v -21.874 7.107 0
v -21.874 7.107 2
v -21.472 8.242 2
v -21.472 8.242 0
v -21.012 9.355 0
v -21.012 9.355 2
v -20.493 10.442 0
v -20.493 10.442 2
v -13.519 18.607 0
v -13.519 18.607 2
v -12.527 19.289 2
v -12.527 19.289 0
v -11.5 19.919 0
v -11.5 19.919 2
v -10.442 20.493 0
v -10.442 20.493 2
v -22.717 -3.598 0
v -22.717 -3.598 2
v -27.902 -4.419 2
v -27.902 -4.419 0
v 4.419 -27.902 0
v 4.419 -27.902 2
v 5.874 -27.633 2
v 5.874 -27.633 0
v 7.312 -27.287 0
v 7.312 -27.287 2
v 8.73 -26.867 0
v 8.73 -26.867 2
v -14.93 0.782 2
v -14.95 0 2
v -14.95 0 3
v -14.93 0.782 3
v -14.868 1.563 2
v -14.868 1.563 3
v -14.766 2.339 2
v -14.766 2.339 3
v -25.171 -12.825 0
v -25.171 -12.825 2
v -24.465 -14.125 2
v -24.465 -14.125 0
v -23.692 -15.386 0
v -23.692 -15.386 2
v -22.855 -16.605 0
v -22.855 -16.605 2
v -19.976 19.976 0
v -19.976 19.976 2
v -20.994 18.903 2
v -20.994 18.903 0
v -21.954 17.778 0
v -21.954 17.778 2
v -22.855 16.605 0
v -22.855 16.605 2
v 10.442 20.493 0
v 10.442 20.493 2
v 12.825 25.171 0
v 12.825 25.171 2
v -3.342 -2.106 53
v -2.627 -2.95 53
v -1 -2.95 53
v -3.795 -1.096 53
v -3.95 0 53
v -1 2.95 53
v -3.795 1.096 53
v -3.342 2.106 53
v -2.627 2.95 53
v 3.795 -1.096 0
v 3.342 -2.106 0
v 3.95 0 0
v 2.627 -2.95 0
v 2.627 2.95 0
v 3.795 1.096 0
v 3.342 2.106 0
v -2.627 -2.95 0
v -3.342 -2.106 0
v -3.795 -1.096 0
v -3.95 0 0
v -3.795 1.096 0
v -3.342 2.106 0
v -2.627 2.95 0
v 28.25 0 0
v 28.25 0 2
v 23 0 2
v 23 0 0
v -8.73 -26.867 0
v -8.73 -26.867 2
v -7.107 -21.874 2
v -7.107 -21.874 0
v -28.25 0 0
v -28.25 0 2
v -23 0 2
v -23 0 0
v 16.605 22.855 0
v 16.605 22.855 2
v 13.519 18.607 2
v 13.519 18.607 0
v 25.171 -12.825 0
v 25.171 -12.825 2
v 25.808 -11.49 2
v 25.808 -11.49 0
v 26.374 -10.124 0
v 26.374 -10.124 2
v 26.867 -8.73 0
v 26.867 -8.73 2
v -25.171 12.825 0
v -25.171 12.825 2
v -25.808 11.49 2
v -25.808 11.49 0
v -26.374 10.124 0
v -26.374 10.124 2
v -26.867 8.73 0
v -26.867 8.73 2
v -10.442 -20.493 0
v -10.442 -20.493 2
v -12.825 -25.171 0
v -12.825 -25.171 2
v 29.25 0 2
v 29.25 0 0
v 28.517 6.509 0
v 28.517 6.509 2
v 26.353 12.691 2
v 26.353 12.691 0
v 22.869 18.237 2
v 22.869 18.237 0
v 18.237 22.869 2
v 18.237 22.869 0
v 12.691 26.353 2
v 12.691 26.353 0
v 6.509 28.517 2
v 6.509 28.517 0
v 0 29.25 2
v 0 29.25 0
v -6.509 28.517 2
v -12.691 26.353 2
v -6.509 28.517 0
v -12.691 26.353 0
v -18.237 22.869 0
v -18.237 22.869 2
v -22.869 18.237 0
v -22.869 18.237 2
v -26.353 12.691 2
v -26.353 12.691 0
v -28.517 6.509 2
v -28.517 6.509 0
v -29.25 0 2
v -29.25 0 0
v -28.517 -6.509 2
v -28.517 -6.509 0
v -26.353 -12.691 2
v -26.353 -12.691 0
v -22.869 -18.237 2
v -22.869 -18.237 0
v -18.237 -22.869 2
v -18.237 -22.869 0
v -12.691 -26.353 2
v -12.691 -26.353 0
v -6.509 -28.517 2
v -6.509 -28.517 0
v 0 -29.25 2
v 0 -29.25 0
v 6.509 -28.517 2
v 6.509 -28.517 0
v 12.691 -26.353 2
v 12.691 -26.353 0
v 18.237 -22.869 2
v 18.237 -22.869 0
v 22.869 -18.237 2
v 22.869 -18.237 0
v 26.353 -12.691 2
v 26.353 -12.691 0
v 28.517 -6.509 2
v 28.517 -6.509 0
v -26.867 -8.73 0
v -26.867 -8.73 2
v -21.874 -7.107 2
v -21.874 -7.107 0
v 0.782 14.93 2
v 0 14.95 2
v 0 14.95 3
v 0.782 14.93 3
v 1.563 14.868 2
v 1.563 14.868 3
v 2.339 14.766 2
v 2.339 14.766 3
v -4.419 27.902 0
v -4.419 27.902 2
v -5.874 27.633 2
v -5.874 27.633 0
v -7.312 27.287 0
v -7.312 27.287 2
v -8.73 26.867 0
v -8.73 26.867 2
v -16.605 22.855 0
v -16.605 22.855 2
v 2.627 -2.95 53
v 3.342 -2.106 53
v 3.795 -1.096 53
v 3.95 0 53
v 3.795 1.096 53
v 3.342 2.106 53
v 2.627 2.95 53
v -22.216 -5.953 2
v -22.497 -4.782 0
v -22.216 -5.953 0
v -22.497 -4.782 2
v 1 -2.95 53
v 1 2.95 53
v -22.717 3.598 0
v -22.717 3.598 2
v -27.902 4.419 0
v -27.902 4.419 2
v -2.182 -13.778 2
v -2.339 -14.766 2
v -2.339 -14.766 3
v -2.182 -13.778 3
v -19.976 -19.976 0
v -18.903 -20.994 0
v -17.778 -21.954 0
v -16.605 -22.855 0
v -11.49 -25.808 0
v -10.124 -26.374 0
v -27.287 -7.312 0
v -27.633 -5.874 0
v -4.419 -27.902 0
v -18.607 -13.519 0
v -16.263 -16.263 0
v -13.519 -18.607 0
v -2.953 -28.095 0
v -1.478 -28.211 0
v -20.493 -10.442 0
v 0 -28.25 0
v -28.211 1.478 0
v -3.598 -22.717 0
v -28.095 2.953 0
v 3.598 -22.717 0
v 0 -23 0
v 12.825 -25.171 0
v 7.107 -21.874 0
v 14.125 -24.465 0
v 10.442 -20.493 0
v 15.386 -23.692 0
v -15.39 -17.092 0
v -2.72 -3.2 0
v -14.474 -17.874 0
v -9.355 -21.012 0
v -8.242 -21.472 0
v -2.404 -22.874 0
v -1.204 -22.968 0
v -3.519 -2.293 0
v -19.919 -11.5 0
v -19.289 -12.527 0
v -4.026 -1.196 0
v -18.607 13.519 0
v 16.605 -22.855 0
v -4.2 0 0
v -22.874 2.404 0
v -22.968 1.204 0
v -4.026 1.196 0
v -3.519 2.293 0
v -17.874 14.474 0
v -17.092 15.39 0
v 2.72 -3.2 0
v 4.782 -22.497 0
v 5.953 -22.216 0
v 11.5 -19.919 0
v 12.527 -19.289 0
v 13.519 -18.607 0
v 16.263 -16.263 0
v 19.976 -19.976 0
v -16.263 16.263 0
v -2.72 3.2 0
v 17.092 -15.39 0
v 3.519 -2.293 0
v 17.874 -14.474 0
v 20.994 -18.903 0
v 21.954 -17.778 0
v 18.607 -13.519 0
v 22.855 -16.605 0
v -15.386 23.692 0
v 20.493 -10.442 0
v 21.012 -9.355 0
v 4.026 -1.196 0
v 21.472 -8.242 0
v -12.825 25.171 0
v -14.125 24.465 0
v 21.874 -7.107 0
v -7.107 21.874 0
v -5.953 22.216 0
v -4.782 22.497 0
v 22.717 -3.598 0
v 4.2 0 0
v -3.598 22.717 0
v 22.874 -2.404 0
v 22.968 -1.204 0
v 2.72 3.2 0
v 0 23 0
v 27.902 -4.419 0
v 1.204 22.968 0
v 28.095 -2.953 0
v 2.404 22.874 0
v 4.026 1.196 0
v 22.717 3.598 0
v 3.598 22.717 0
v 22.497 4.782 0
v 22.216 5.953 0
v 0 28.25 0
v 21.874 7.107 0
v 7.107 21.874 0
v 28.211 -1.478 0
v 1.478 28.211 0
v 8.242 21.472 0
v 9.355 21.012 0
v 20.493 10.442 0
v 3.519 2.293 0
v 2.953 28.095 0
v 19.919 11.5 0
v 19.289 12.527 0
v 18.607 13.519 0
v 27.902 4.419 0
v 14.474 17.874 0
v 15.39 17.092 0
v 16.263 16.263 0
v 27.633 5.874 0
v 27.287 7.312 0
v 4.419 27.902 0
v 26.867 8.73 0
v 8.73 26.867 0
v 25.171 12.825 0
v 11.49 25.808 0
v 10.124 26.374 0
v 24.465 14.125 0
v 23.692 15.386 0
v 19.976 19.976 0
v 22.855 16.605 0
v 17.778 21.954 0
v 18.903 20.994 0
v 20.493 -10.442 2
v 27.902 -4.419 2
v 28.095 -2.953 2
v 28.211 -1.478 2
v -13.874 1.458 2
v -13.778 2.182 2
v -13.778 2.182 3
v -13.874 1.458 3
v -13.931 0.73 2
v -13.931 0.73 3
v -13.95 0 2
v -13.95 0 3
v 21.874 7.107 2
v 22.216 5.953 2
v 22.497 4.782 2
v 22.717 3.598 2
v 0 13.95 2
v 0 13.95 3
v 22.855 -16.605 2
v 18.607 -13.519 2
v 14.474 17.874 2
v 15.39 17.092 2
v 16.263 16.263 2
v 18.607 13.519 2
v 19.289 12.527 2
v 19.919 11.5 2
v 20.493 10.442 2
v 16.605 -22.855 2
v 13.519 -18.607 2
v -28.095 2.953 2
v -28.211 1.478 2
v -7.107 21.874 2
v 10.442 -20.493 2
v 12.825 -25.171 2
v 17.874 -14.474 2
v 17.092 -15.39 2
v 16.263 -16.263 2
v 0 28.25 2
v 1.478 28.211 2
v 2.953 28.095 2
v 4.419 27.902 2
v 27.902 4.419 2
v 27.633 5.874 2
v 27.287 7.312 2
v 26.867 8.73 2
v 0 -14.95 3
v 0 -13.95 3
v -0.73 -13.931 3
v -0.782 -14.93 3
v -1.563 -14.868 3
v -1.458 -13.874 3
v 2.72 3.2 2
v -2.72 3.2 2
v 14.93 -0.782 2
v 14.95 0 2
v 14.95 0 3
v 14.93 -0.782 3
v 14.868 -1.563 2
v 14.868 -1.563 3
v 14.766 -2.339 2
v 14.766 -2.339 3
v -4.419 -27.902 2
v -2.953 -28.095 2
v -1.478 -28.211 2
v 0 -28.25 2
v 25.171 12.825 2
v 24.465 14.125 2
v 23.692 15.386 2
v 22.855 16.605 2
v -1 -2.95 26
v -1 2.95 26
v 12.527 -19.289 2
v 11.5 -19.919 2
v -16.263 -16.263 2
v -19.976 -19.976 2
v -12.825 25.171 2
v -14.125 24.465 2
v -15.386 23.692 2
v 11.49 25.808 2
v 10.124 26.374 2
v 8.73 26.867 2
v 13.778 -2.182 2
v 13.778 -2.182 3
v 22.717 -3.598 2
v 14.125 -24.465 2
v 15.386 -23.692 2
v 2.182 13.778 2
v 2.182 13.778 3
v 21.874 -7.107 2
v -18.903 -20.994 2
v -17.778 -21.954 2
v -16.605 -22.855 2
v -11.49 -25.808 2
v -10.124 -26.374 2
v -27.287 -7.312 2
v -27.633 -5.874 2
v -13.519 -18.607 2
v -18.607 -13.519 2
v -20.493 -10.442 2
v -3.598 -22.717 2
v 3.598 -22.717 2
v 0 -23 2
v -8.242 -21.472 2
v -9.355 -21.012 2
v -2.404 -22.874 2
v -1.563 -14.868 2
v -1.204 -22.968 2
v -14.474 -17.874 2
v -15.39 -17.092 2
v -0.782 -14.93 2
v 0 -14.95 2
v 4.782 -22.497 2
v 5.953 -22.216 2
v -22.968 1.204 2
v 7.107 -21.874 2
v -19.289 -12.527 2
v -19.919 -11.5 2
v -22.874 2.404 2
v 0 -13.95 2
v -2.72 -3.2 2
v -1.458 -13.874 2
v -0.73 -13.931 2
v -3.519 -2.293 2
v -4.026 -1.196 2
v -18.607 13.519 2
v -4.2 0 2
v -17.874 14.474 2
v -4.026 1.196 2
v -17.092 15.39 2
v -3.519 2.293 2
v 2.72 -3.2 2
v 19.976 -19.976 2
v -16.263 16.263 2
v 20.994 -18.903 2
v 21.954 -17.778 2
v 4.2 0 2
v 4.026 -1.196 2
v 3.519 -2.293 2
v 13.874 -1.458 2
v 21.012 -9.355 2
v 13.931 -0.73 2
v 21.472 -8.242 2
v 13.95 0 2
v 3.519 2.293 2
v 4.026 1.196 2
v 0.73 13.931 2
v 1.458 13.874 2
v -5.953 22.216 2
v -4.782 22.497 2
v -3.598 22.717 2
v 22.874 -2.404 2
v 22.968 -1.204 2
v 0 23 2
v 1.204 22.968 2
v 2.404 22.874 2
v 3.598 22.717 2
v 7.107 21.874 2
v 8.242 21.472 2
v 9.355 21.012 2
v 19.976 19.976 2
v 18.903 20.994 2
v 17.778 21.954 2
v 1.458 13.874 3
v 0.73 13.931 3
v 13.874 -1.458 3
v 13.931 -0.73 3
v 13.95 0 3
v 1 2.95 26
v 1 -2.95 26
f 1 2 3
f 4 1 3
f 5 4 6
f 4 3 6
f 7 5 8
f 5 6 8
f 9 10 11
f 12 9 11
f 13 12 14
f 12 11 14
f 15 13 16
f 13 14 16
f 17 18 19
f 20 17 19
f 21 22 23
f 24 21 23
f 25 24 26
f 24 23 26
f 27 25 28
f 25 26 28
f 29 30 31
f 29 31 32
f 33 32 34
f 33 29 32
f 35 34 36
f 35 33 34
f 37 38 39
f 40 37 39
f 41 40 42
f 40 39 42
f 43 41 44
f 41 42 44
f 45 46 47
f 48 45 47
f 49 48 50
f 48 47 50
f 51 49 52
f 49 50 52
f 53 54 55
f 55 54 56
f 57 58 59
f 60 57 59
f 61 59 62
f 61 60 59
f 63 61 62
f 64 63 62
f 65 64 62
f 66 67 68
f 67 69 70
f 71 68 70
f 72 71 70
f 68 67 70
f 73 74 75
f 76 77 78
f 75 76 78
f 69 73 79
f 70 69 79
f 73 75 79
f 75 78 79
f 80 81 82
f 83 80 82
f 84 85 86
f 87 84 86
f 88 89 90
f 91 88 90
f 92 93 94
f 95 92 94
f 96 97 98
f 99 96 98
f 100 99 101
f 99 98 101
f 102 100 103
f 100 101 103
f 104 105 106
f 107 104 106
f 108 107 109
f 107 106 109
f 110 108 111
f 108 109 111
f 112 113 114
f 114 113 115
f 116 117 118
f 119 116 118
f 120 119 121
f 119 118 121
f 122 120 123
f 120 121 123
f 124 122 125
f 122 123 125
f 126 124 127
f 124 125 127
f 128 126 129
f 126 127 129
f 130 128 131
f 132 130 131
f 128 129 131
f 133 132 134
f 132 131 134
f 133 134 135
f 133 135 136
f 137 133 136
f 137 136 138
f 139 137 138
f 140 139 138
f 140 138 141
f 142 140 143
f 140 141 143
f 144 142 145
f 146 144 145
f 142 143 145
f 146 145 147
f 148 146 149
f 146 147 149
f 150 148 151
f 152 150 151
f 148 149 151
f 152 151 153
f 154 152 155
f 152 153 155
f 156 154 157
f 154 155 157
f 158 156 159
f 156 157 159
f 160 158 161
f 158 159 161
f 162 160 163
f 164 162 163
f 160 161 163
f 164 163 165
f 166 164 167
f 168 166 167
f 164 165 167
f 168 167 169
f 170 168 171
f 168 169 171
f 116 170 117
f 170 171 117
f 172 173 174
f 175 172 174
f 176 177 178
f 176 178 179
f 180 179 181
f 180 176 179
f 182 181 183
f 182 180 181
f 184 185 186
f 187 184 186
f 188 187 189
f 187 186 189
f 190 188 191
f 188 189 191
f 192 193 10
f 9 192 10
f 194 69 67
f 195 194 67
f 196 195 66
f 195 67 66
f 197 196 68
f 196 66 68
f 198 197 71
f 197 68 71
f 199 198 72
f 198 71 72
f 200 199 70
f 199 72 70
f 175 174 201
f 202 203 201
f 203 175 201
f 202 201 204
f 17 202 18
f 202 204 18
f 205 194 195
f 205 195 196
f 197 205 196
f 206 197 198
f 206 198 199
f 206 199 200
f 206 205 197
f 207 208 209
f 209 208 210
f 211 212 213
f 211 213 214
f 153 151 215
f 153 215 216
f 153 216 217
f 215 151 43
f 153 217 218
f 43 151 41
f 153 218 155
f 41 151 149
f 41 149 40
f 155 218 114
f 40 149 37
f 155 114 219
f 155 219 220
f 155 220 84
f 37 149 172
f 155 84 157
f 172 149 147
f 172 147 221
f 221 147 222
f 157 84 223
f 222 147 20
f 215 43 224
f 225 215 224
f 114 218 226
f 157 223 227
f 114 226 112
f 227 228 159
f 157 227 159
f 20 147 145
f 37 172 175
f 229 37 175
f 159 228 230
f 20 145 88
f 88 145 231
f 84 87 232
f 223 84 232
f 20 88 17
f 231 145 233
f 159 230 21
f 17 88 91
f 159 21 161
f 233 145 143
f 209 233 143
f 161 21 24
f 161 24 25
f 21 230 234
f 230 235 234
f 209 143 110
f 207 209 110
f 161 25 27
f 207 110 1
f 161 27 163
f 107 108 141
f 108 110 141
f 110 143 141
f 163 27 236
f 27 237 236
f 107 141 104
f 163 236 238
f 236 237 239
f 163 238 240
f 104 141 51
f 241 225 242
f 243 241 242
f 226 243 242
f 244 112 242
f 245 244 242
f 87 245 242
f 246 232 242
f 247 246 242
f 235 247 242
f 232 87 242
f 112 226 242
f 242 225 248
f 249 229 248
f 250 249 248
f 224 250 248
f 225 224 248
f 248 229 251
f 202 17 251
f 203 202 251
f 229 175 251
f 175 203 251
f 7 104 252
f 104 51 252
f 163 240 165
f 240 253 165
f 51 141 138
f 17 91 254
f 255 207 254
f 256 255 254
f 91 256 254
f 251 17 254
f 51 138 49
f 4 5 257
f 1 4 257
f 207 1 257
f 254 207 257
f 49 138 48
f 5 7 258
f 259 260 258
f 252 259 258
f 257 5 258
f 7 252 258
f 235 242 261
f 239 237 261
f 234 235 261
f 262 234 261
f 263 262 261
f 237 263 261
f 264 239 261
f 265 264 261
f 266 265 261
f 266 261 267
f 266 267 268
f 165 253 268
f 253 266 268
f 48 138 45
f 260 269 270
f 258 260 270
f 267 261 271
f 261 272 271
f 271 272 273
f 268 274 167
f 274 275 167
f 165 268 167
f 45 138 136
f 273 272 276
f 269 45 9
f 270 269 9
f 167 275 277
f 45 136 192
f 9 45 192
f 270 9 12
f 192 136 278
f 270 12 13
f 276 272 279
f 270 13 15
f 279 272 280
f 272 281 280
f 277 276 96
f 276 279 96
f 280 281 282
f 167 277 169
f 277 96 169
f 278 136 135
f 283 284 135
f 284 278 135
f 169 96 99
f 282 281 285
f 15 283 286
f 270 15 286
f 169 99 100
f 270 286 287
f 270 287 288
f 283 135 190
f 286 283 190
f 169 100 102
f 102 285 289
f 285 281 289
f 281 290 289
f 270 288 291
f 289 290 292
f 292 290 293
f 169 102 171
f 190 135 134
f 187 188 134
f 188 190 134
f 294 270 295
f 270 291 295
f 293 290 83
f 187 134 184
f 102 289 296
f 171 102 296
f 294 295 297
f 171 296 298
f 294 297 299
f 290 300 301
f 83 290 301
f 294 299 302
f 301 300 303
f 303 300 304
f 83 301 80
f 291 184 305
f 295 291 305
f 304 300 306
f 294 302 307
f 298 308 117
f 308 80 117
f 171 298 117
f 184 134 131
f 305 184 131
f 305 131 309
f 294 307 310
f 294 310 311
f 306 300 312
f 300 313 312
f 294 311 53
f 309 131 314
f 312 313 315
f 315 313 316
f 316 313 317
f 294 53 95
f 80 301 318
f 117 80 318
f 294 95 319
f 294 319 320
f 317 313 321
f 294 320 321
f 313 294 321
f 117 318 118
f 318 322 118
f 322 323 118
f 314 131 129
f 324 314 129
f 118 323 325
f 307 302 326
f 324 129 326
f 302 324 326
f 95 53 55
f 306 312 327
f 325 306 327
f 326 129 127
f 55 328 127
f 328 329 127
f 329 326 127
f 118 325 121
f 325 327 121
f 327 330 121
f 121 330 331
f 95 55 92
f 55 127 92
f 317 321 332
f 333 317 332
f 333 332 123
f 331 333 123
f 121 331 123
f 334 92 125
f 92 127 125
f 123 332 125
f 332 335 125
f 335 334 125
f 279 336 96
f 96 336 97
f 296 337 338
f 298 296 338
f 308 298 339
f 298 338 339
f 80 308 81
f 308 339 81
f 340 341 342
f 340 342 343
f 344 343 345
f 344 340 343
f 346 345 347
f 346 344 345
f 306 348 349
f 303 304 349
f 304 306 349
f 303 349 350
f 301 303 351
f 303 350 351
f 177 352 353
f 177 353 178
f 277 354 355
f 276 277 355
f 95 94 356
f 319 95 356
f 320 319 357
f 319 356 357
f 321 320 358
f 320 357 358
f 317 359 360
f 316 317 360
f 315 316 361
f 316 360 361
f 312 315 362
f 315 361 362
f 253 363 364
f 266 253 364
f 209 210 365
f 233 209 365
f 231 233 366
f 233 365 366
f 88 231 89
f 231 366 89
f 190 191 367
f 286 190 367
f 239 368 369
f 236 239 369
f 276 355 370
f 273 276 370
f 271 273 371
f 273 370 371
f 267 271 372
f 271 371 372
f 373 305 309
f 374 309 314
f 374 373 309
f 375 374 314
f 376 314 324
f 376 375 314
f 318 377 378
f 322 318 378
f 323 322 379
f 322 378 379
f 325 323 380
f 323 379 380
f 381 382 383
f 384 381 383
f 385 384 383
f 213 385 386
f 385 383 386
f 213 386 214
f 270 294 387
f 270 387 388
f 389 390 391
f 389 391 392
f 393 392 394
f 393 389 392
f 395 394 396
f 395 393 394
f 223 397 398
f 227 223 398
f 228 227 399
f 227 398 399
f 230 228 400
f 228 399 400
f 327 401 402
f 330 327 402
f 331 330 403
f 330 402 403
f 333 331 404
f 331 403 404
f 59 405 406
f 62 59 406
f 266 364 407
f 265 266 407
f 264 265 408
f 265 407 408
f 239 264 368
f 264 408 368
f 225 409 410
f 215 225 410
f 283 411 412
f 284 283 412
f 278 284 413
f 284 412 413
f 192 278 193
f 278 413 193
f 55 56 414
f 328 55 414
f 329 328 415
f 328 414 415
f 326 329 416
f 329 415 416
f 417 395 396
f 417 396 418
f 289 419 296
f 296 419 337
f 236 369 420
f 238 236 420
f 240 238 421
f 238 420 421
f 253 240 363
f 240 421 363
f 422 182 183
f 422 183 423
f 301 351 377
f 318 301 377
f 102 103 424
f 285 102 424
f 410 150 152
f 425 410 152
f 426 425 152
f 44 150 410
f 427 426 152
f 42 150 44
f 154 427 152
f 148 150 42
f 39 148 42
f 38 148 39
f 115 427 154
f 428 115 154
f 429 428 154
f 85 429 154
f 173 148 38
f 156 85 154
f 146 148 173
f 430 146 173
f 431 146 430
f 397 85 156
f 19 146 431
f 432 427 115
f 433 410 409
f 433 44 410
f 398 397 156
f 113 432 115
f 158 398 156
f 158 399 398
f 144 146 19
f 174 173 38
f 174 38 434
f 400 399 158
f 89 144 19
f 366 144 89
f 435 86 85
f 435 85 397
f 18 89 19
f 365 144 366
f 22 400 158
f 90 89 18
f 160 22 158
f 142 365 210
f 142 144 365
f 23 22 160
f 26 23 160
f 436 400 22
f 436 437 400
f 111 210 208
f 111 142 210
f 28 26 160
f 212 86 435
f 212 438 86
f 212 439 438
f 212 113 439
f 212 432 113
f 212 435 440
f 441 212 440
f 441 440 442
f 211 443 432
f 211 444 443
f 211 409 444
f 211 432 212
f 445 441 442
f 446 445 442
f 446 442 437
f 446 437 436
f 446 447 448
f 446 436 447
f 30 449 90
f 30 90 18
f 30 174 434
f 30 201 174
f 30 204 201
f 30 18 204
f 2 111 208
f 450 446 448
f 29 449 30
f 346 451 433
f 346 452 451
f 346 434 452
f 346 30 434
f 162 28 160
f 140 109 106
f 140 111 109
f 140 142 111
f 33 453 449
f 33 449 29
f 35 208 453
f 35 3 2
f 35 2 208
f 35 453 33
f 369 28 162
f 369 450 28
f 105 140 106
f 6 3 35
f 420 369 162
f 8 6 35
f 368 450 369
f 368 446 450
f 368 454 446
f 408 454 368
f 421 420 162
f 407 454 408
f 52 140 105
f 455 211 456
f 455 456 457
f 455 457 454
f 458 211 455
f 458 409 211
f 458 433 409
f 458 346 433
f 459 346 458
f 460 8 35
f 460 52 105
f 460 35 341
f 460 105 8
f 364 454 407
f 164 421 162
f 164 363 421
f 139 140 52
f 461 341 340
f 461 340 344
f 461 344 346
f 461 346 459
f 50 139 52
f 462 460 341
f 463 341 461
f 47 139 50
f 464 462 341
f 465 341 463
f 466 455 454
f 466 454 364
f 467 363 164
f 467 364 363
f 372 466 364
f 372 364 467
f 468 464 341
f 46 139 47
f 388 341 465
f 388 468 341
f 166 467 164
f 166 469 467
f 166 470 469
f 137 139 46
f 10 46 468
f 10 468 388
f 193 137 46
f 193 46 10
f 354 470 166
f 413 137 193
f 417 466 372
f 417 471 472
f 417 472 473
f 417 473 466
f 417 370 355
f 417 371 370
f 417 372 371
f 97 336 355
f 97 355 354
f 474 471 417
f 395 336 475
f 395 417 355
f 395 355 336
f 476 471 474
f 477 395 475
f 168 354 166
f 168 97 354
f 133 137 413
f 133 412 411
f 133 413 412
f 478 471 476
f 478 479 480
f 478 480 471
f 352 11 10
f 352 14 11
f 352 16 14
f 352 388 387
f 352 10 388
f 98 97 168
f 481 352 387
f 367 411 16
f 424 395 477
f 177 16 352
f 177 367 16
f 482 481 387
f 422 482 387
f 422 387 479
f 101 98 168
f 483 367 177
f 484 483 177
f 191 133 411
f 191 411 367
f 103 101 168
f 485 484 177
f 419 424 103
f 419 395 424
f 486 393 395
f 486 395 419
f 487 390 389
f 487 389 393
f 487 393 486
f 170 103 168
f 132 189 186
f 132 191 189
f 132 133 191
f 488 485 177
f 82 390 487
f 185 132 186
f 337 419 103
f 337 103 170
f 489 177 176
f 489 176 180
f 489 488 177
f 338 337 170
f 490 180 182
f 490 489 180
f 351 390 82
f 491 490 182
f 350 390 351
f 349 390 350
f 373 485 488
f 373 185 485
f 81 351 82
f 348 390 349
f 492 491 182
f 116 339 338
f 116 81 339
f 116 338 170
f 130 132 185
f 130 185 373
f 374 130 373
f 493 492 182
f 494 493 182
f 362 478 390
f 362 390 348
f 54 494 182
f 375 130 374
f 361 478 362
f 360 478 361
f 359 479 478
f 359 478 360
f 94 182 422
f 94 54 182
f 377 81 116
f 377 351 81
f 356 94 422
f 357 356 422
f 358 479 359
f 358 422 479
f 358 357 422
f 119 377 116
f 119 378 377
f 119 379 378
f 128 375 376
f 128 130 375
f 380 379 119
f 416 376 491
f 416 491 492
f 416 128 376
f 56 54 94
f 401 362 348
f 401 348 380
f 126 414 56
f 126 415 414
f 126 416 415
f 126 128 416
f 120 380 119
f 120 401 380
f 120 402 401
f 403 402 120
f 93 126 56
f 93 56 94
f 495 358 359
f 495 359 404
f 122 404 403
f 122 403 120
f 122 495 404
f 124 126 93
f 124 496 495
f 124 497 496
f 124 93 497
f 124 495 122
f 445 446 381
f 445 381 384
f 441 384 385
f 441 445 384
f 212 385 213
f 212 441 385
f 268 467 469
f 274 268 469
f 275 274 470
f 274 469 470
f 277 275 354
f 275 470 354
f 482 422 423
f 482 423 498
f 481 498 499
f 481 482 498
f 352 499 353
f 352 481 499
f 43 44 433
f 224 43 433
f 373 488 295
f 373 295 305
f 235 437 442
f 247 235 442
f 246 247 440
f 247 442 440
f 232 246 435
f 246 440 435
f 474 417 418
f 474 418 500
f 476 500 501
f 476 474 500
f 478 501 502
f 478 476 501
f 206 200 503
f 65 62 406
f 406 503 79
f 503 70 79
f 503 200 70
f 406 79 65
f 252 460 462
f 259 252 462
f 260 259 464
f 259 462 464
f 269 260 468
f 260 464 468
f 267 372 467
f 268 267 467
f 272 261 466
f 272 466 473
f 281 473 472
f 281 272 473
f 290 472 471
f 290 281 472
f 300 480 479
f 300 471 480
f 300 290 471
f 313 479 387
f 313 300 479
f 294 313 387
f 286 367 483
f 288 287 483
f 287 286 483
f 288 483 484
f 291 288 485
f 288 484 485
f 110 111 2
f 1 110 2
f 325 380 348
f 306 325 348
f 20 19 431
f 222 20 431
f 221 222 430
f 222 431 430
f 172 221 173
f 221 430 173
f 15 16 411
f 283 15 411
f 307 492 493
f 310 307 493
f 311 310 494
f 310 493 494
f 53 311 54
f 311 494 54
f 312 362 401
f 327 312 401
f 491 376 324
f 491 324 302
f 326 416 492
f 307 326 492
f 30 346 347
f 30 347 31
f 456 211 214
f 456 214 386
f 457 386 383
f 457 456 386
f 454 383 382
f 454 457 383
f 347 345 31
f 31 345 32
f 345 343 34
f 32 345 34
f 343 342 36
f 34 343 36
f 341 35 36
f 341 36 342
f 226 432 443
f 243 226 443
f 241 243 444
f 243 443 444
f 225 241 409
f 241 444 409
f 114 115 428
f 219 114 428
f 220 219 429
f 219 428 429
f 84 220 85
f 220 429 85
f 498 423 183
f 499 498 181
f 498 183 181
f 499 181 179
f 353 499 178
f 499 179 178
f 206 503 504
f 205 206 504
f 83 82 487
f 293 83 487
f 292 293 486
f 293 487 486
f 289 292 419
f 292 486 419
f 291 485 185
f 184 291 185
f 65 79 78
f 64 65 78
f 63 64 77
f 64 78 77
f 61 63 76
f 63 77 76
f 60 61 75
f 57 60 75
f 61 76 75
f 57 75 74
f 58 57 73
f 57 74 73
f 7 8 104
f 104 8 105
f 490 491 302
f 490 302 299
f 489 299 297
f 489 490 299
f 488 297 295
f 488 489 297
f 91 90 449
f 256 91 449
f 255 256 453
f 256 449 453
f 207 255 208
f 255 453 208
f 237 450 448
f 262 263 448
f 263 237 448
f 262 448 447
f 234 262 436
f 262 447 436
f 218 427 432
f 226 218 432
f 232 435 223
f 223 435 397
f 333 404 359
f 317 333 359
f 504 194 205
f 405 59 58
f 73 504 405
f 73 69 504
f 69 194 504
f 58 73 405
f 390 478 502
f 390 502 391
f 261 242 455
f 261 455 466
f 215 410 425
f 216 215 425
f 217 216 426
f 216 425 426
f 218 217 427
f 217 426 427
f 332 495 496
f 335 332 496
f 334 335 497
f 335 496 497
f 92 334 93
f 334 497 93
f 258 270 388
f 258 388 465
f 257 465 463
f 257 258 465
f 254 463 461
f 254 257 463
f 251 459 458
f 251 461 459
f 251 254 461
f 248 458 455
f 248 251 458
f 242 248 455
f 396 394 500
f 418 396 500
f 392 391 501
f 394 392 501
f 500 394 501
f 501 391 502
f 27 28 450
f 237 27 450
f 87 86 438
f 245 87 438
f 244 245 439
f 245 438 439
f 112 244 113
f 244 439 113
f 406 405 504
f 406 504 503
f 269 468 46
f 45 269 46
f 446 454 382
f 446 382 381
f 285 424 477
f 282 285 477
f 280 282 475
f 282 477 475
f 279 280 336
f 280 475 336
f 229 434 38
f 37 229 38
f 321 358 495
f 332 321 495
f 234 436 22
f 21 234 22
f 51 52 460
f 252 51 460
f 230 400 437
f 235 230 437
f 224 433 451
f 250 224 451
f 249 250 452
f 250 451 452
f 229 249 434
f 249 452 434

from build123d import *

# Parameters (mm, degrees)
SKETCH1_R             = 29.25
BOSS_EXTRUDE1_DEPTH   = 2
BOSS_EXTRUDE2_DEPTH   = 1
AXEL_START            = 17.516826032
AXEL_DEPTH            = 53
AXEL_2_OUTLINE_W      = 5.9
AXEL_2_OUTLINE_H      = 2
AXEL_2_DEPTH          = 26
BODY_MOVE_COPY2_ANGLE = 90
CUT_EXTRUDE1_DEPTH    = 10
CUT_EXTRUDE2_DEPTH    = 10


with BuildPart() as part:
    # Sketch1 → Boss-Extrude1 (new body)
    with BuildSketch(Plane.XY):
        Circle(SKETCH1_R)
    extrude(amount=BOSS_EXTRUDE1_DEPTH)

    # Sketch2 → Boss-Extrude2 (add)
    with BuildSketch(Plane.XY.offset(2)):
        with BuildLine():
            Line((0, 13.95), (0, 14.95))
            ThreePointArc((0, 14.95), (1.172963481, 14.903914139), (2.338695252, 14.765940692))
            Line((2.338695252, 14.765940692), (2.182260787, 13.778252351))
            ThreePointArc((2.182260787, 13.778252351), (1.094504385, 13.906996806), (0, 13.95))
        make_face()
        with BuildLine():
            Line((13.95, 0), (14.95, 0))
            ThreePointArc((14.95, 0), (14.903914139, -1.172963481), (14.765940692, -2.338695252))
            Line((14.765940692, -2.338695252), (13.778252351, -2.182260787))
            ThreePointArc((13.778252351, -2.182260787), (13.906996806, -1.094504385), (13.95, 0))
        make_face()
        with BuildLine():
            Line((0, -13.95), (0, -14.95))
            ThreePointArc((0, -14.95), (-1.172963481, -14.903914139), (-2.338695252, -14.765940692))
            Line((-2.338695252, -14.765940692), (-2.182260787, -13.778252351))
            ThreePointArc((-2.182260787, -13.778252351), (-1.094504385, -13.906996806), (0, -13.95))
        make_face()
        with BuildLine():
            Line((-13.95, 0), (-14.95, 0))
            ThreePointArc((-14.95, 0), (-14.903914139, 1.172963481), (-14.765940692, 2.338695252))
            Line((-14.765940692, 2.338695252), (-13.778252351, 2.182260787))
            ThreePointArc((-13.778252351, 2.182260787), (-13.906996806, 1.094504385), (-13.95, 0))
        make_face()
    extrude(amount=BOSS_EXTRUDE2_DEPTH)

    # Sketch3 → Cut-Extrude1 (cut)
    with BuildSketch(Plane(origin=(0, 0, 0), x_dir=(-1, 0, 0), z_dir=(0, 0, -1))):
        with BuildLine():
            Line((-2.720294102, 3.2), (2.720294102, 3.2))
            ThreePointArc((2.720294102, 3.2), (4.2, 0), (2.720294102, -3.2))
            Line((2.720294102, -3.2), (-2.720294102, -3.2))
            ThreePointArc((-2.720294102, -3.2), (-4.2, 0), (-2.720294102, 3.2))
        make_face()
    extrude(amount=-CUT_EXTRUDE1_DEPTH, mode=Mode.SUBTRACT)

    # Sketch4 → Cut-Extrude2 (cut)
    with BuildSketch(Plane.XY.offset(2)):
        with BuildLine():
            Line((0, 23), (0, 28.25))
            ThreePointArc((0, 28.25), (2.216469454, 28.162914678), (4.419273637, 27.902195622))
            Line((4.419273637, 27.902195622), (3.597992696, 22.716831834))
            ThreePointArc((3.597992696, 22.716831834), (1.804559202, 22.929098676), (0, 23))
        make_face()
        with BuildLine():
            Line((10.441781494, 20.493150056), (12.825231618, 25.170934308))
            ThreePointArc((12.825231618, 25.170934308), (10.810806964, 26.099596793), (8.729730091, 26.867346585))
            Line((8.729730091, 26.867346585), (7.107390871, 21.874299875))
            ThreePointArc((7.107390871, 21.874299875), (8.801718944, 21.249229248), (10.441781494, 20.493150056))
        make_face()
        with BuildLine():
            Line((16.263455967, 16.263455967), (19.975766569, 19.975766569))
            ThreePointArc((19.975766569, 19.975766569), (18.346907365, 21.481468528), (16.604933377, 22.854730091))
            Line((16.604933377, 22.854730091), (13.519060803, 18.607390871))
            ThreePointArc((13.519060803, 18.607390871), (14.937305112, 17.489337209), (16.263455967, 16.263455967))
        make_face()
        with BuildLine():
            Line((20.493150056, 10.441781494), (25.170934308, 12.825231618))
            ThreePointArc((25.170934308, 12.825231618), (24.087084643, 14.760584453), (22.854730091, 16.604933377))
            Line((22.854730091, 16.604933377), (18.607390871, 13.519060803))
            ThreePointArc((18.607390871, 13.519060803), (19.61072378, 12.017466988), (20.493150056, 10.441781494))
        make_face()
        with BuildLine():
            Line((22.716831834, 3.597992696), (27.902195622, 4.419273637))
            ThreePointArc((27.902195622, 4.419273637), (27.469450251, 6.594831529), (26.867346585, 8.729730091))
            Line((26.867346585, 8.729730091), (21.874299875, 7.107390871))
            ThreePointArc((21.874299875, 7.107390871), (22.364508169, 5.369243369), (22.716831834, 3.597992696))
        make_face()
        with BuildLine():
            Line((22.716831834, -3.597992696), (27.902195622, -4.419273637))
            ThreePointArc((27.902195622, -4.419273637), (28.162914678, -2.216469454), (28.25, 0))
            Line((28.25, 0), (23, 0))
            ThreePointArc((23, 0), (22.929098676, -1.804559202), (22.716831834, -3.597992696))
        make_face()
        with BuildLine():
            Line((20.493150056, -10.441781494), (25.170934308, -12.825231618))
            ThreePointArc((25.170934308, -12.825231618), (26.099596793, -10.810806964), (26.867346585, -8.729730091))
            Line((26.867346585, -8.729730091), (21.874299875, -7.107390871))
            ThreePointArc((21.874299875, -7.107390871), (21.249229248, -8.801718944), (20.493150056, -10.441781494))
        make_face()
        with BuildLine():
            Line((16.263455967, -16.263455967), (19.975766569, -19.975766569))
            ThreePointArc((19.975766569, -19.975766569), (21.481468528, -18.346907365), (22.854730091, -16.604933377))
            Line((22.854730091, -16.604933377), (18.607390871, -13.519060803))
            ThreePointArc((18.607390871, -13.519060803), (17.489337209, -14.937305112), (16.263455967, -16.263455967))
        make_face()
        with BuildLine():
            Line((10.441781494, -20.493150056), (12.825231618, -25.170934308))
            ThreePointArc((12.825231618, -25.170934308), (14.760584453, -24.087084643), (16.604933377, -22.854730091))
            Line((16.604933377, -22.854730091), (13.519060803, -18.607390871))
            ThreePointArc((13.519060803, -18.607390871), (12.017466988, -19.61072378), (10.441781494, -20.493150056))
        make_face()
        with BuildLine():
            Line((3.597992696, -22.716831834), (4.419273637, -27.902195622))
            ThreePointArc((4.419273637, -27.902195622), (6.594831529, -27.469450251), (8.729730091, -26.867346585))
            Line((8.729730091, -26.867346585), (7.107390871, -21.874299875))
            ThreePointArc((7.107390871, -21.874299875), (5.369243369, -22.364508169), (3.597992696, -22.716831834))
        make_face()
        with BuildLine():
            Line((-3.597992696, -22.716831834), (-4.419273637, -27.902195622))
            ThreePointArc((-4.419273637, -27.902195622), (-2.216469454, -28.162914678), (0, -28.25))
            Line((0, -28.25), (0, -23))
            ThreePointArc((0, -23), (-1.804559202, -22.929098676), (-3.597992696, -22.716831834))
        make_face()
        with BuildLine():
            Line((-10.441781494, -20.493150056), (-12.825231618, -25.170934308))
            ThreePointArc((-12.825231618, -25.170934308), (-10.810806964, -26.099596793), (-8.729730091, -26.867346585))
            Line((-8.729730091, -26.867346585), (-7.107390871, -21.874299875))
            ThreePointArc((-7.107390871, -21.874299875), (-8.801718944, -21.249229248), (-10.441781494, -20.493150056))
        make_face()
        with BuildLine():
            Line((-16.263455967, -16.263455967), (-19.975766569, -19.975766569))
            ThreePointArc((-19.975766569, -19.975766569), (-18.346907365, -21.481468528), (-16.604933377, -22.854730091))
            Line((-16.604933377, -22.854730091), (-13.519060803, -18.607390871))
            ThreePointArc((-13.519060803, -18.607390871), (-14.937305112, -17.489337209), (-16.263455967, -16.263455967))
        make_face()
        with BuildLine():
            Line((-20.493150056, -10.441781494), (-25.170934308, -12.825231618))
            ThreePointArc((-25.170934308, -12.825231618), (-24.087084643, -14.760584453), (-22.854730091, -16.604933377))
            Line((-22.854730091, -16.604933377), (-18.607390871, -13.519060803))
            ThreePointArc((-18.607390871, -13.519060803), (-19.61072378, -12.017466988), (-20.493150056, -10.441781494))
        make_face()
        with BuildLine():
            Line((-22.716831834, -3.597992696), (-27.902195622, -4.419273637))
            ThreePointArc((-27.902195622, -4.419273637), (-27.469450251, -6.594831529), (-26.867346585, -8.729730091))
            Line((-26.867346585, -8.729730091), (-21.874299875, -7.107390871))
            ThreePointArc((-21.874299875, -7.107390871), (-22.364508169, -5.369243369), (-22.716831834, -3.597992696))
        make_face()
        with BuildLine():
            Line((-22.716831834, 3.597992696), (-27.902195622, 4.419273637))
            ThreePointArc((-27.902195622, 4.419273637), (-28.162914678, 2.216469454), (-28.25, 0))
            Line((-28.25, 0), (-23, 0))
            ThreePointArc((-23, 0), (-22.929098676, 1.804559202), (-22.716831834, 3.597992696))
        make_face()
        with BuildLine():
            Line((-20.493150056, 10.441781494), (-25.170934308, 12.825231618))
            ThreePointArc((-25.170934308, 12.825231618), (-26.099596793, 10.810806964), (-26.867346585, 8.729730091))
            Line((-26.867346585, 8.729730091), (-21.874299875, 7.107390871))
            ThreePointArc((-21.874299875, 7.107390871), (-21.249229248, 8.801718944), (-20.493150056, 10.441781494))
        make_face()
        with BuildLine():
            Line((-16.263455967, 16.263455967), (-19.975766569, 19.975766569))
            ThreePointArc((-19.975766569, 19.975766569), (-21.481468528, 18.346907365), (-22.854730091, 16.604933377))
            Line((-22.854730091, 16.604933377), (-18.607390871, 13.519060803))
            ThreePointArc((-18.607390871, 13.519060803), (-17.489337209, 14.937305112), (-16.263455967, 16.263455967))
        make_face()
        with BuildLine():
            Line((-10.441781494, 20.493150056), (-12.825231618, 25.170934308))
            ThreePointArc((-12.825231618, 25.170934308), (-14.760584453, 24.087084643), (-16.604933377, 22.854730091))
            Line((-16.604933377, 22.854730091), (-13.519060803, 18.607390871))
            ThreePointArc((-13.519060803, 18.607390871), (-12.017466988, 19.61072378), (-10.441781494, 20.493150056))
        make_face()
        with BuildLine():
            Line((-3.597992696, 22.716831834), (-4.419273637, 27.902195622))
            ThreePointArc((-4.419273637, 27.902195622), (-6.594831529, 27.469450251), (-8.729730091, 26.867346585))
            Line((-8.729730091, 26.867346585), (-7.107390871, 21.874299875))
            ThreePointArc((-7.107390871, 21.874299875), (-5.369243369, 22.364508169), (-3.597992696, 22.716831834))
        make_face()
    extrude(amount=-CUT_EXTRUDE2_DEPTH, mode=Mode.SUBTRACT)


with BuildPart() as body_2:
    # Axel: read off the stored shape, not the designer's step
    # Axel outline → Axel (new body)
    with BuildSketch(Plane.YZ.offset(AXEL_START)):
        with BuildLine():
            Line((1.513004267, 20.746673909), (1.513004267, 22.373459016))
            ThreePointArc((1.513004267, 22.373459016), (-1.436995733, 23.696673909), (-4.386995733, 22.373459016))
            Line((-4.386995733, 22.373459016), (-4.386995733, 20.746673909))
            Line((-4.386995733, 20.746673909), (1.513004267, 20.746673909))
        make_face()
        with BuildLine():
            Line((1.513004267, 17.119888802), (1.513004267, 18.746673909))
            Line((1.513004267, 18.746673909), (-4.386995733, 18.746673909))
            Line((-4.386995733, 18.746673909), (-4.386995733, 17.119888802))
            ThreePointArc((-4.386995733, 17.119888802), (-1.436995733, 15.796673909), (1.513004267, 17.119888802))
        make_face()
    extrude(amount=AXEL_DEPTH)

    # Axel 2 outline → Axel 2 (add)
    with BuildSketch(Plane.YZ.offset(AXEL_START)):
        with Locations((-1.436995733, 19.746673909)):
            Rectangle(AXEL_2_OUTLINE_W, AXEL_2_OUTLINE_H)
    extrude(amount=AXEL_2_DEPTH)


with BuildPart() as body_2_1:
    # Body-Move/Copy2: read off the stored shape, not the designer's step
    # Body-Move/Copy2: moved
    add(body_2.part.moved(Location((-17.516826, 1.4369957, -19.7466739))).rotate(Axis((0, 0, 0), (0, -1, 0)), BODY_MOVE_COPY2_ANGLE))


solid = Compound([part.part, body_2_1.part])
